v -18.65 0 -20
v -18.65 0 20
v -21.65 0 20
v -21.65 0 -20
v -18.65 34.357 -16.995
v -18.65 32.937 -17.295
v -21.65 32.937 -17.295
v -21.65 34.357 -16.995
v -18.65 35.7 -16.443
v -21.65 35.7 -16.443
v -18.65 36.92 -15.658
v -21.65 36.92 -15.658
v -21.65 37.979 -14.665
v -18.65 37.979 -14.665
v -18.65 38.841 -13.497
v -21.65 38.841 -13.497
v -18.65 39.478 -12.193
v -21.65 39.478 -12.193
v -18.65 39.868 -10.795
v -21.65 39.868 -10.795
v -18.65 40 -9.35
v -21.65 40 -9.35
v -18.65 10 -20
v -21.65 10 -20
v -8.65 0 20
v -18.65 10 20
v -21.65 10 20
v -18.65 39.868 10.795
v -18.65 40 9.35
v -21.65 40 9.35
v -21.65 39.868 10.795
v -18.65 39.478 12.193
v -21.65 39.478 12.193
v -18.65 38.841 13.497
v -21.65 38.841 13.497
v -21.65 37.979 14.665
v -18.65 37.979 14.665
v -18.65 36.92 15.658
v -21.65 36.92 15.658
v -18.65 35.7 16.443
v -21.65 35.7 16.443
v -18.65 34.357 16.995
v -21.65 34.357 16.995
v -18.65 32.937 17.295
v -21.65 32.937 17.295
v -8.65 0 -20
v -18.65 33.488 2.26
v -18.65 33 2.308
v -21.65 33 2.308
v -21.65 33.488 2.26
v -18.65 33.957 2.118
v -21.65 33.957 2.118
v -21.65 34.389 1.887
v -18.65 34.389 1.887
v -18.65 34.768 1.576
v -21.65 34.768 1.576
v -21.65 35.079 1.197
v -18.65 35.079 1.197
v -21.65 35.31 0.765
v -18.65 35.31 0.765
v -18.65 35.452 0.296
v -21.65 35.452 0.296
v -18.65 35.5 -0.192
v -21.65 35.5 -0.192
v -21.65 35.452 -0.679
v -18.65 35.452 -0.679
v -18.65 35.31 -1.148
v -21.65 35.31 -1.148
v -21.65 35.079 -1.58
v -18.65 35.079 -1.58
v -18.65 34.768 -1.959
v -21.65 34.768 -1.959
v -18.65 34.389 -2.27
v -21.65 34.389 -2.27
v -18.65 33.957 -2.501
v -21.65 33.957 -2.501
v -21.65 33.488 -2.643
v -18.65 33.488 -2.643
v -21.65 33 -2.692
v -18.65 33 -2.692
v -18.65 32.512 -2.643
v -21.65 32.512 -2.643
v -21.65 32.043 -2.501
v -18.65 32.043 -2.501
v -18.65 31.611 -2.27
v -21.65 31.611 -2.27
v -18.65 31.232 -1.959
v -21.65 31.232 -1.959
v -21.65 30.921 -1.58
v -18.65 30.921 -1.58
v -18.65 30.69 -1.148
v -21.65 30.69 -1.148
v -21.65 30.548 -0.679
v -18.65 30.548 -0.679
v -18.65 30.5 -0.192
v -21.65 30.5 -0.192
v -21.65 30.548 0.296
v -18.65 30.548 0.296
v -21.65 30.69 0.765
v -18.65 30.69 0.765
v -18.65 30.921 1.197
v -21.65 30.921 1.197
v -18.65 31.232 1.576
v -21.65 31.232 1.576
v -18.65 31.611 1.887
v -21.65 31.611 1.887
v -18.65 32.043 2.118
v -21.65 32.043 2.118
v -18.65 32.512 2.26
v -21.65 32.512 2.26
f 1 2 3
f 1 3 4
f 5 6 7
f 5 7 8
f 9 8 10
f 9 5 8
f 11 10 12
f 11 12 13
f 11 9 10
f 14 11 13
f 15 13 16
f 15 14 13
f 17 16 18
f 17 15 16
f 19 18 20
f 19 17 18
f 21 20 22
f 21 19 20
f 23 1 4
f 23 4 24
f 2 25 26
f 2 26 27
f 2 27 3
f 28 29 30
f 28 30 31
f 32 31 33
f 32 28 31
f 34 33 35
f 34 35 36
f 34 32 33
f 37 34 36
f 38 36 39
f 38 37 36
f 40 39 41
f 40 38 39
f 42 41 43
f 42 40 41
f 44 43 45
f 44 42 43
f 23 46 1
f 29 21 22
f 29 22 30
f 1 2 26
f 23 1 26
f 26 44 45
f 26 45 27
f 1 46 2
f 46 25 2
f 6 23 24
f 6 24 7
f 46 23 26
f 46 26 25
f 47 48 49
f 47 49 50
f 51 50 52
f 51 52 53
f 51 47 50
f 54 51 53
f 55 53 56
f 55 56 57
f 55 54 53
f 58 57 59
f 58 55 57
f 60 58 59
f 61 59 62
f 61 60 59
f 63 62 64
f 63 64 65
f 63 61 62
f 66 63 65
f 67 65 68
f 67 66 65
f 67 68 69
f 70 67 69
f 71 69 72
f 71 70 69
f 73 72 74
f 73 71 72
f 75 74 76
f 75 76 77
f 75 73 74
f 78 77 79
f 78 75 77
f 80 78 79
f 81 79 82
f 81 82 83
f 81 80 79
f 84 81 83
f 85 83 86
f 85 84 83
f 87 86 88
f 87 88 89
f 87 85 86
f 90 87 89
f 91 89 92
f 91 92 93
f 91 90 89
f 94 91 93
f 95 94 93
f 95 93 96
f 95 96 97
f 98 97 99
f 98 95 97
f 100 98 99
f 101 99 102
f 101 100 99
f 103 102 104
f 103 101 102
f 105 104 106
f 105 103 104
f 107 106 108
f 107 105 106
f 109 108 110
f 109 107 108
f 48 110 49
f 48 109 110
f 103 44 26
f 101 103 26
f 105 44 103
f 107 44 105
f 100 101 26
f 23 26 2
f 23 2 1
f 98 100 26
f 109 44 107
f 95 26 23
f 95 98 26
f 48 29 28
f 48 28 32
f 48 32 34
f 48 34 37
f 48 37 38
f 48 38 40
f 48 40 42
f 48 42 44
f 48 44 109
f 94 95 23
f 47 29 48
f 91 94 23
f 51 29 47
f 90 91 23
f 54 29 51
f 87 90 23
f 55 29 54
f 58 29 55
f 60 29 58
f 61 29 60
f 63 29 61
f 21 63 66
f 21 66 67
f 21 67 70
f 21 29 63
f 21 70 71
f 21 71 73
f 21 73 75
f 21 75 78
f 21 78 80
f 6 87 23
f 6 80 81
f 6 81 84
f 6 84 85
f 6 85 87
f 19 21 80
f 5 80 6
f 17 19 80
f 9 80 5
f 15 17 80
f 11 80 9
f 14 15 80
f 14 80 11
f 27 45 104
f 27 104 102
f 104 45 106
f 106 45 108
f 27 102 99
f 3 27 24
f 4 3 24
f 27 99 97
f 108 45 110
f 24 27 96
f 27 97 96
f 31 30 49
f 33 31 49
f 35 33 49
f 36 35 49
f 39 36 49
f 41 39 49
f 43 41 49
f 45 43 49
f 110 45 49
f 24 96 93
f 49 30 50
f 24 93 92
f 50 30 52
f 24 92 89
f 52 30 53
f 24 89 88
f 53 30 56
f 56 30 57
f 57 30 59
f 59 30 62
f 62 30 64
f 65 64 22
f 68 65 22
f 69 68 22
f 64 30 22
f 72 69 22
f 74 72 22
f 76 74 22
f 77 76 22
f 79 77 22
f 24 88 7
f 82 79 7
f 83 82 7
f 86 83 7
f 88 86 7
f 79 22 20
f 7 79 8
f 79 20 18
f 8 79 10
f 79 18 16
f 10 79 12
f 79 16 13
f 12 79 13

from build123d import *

# Parameters (mm, degrees)
SKETCH2_R           = 2.5
BOSS_EXTRUDE1_DEPTH = 3
BOSS_EXTRUDE2_DEPTH = 20


with BuildPart() as part:
    # Sketch2 → Boss-Extrude1 (new body)
    with BuildSketch(Plane.ZY.offset(18.65)):
        with BuildLine():
            Line((20, 10), (20, 0))
            Line((20, 0), (-20, 0))
            Line((-20, 0), (-20, 10))
            Line((-20, 10), (-17.294825357, 32.937019605))
            ThreePointArc((-17.294825357, 32.937019605), (-14.665143895, 37.978969679), (-9.349890224, 40))
            Line((-9.349890224, 40), (9.349890224, 40))
            ThreePointArc((9.349890224, 40), (14.665143895, 37.978969679), (17.294825357, 32.937019605))
            Line((17.294825357, 32.937019605), (20, 10))
        make_face()
        with Locations((-0.191504709, 33)):
            Circle(SKETCH2_R, mode=Mode.SUBTRACT)
    extrude(amount=BOSS_EXTRUDE1_DEPTH)


with BuildPart() as body_2:
    # Sketch3 → Boss-Extrude2 (new, symmetric)
    with BuildSketch(Plane.XY):
        Polygon((-18.65, 10), (-8.65, 0), (-18.65, 0), align=None)
    extrude(amount=BOSS_EXTRUDE2_DEPTH, both=True)


solid = Compound([part.part, body_2.part])
